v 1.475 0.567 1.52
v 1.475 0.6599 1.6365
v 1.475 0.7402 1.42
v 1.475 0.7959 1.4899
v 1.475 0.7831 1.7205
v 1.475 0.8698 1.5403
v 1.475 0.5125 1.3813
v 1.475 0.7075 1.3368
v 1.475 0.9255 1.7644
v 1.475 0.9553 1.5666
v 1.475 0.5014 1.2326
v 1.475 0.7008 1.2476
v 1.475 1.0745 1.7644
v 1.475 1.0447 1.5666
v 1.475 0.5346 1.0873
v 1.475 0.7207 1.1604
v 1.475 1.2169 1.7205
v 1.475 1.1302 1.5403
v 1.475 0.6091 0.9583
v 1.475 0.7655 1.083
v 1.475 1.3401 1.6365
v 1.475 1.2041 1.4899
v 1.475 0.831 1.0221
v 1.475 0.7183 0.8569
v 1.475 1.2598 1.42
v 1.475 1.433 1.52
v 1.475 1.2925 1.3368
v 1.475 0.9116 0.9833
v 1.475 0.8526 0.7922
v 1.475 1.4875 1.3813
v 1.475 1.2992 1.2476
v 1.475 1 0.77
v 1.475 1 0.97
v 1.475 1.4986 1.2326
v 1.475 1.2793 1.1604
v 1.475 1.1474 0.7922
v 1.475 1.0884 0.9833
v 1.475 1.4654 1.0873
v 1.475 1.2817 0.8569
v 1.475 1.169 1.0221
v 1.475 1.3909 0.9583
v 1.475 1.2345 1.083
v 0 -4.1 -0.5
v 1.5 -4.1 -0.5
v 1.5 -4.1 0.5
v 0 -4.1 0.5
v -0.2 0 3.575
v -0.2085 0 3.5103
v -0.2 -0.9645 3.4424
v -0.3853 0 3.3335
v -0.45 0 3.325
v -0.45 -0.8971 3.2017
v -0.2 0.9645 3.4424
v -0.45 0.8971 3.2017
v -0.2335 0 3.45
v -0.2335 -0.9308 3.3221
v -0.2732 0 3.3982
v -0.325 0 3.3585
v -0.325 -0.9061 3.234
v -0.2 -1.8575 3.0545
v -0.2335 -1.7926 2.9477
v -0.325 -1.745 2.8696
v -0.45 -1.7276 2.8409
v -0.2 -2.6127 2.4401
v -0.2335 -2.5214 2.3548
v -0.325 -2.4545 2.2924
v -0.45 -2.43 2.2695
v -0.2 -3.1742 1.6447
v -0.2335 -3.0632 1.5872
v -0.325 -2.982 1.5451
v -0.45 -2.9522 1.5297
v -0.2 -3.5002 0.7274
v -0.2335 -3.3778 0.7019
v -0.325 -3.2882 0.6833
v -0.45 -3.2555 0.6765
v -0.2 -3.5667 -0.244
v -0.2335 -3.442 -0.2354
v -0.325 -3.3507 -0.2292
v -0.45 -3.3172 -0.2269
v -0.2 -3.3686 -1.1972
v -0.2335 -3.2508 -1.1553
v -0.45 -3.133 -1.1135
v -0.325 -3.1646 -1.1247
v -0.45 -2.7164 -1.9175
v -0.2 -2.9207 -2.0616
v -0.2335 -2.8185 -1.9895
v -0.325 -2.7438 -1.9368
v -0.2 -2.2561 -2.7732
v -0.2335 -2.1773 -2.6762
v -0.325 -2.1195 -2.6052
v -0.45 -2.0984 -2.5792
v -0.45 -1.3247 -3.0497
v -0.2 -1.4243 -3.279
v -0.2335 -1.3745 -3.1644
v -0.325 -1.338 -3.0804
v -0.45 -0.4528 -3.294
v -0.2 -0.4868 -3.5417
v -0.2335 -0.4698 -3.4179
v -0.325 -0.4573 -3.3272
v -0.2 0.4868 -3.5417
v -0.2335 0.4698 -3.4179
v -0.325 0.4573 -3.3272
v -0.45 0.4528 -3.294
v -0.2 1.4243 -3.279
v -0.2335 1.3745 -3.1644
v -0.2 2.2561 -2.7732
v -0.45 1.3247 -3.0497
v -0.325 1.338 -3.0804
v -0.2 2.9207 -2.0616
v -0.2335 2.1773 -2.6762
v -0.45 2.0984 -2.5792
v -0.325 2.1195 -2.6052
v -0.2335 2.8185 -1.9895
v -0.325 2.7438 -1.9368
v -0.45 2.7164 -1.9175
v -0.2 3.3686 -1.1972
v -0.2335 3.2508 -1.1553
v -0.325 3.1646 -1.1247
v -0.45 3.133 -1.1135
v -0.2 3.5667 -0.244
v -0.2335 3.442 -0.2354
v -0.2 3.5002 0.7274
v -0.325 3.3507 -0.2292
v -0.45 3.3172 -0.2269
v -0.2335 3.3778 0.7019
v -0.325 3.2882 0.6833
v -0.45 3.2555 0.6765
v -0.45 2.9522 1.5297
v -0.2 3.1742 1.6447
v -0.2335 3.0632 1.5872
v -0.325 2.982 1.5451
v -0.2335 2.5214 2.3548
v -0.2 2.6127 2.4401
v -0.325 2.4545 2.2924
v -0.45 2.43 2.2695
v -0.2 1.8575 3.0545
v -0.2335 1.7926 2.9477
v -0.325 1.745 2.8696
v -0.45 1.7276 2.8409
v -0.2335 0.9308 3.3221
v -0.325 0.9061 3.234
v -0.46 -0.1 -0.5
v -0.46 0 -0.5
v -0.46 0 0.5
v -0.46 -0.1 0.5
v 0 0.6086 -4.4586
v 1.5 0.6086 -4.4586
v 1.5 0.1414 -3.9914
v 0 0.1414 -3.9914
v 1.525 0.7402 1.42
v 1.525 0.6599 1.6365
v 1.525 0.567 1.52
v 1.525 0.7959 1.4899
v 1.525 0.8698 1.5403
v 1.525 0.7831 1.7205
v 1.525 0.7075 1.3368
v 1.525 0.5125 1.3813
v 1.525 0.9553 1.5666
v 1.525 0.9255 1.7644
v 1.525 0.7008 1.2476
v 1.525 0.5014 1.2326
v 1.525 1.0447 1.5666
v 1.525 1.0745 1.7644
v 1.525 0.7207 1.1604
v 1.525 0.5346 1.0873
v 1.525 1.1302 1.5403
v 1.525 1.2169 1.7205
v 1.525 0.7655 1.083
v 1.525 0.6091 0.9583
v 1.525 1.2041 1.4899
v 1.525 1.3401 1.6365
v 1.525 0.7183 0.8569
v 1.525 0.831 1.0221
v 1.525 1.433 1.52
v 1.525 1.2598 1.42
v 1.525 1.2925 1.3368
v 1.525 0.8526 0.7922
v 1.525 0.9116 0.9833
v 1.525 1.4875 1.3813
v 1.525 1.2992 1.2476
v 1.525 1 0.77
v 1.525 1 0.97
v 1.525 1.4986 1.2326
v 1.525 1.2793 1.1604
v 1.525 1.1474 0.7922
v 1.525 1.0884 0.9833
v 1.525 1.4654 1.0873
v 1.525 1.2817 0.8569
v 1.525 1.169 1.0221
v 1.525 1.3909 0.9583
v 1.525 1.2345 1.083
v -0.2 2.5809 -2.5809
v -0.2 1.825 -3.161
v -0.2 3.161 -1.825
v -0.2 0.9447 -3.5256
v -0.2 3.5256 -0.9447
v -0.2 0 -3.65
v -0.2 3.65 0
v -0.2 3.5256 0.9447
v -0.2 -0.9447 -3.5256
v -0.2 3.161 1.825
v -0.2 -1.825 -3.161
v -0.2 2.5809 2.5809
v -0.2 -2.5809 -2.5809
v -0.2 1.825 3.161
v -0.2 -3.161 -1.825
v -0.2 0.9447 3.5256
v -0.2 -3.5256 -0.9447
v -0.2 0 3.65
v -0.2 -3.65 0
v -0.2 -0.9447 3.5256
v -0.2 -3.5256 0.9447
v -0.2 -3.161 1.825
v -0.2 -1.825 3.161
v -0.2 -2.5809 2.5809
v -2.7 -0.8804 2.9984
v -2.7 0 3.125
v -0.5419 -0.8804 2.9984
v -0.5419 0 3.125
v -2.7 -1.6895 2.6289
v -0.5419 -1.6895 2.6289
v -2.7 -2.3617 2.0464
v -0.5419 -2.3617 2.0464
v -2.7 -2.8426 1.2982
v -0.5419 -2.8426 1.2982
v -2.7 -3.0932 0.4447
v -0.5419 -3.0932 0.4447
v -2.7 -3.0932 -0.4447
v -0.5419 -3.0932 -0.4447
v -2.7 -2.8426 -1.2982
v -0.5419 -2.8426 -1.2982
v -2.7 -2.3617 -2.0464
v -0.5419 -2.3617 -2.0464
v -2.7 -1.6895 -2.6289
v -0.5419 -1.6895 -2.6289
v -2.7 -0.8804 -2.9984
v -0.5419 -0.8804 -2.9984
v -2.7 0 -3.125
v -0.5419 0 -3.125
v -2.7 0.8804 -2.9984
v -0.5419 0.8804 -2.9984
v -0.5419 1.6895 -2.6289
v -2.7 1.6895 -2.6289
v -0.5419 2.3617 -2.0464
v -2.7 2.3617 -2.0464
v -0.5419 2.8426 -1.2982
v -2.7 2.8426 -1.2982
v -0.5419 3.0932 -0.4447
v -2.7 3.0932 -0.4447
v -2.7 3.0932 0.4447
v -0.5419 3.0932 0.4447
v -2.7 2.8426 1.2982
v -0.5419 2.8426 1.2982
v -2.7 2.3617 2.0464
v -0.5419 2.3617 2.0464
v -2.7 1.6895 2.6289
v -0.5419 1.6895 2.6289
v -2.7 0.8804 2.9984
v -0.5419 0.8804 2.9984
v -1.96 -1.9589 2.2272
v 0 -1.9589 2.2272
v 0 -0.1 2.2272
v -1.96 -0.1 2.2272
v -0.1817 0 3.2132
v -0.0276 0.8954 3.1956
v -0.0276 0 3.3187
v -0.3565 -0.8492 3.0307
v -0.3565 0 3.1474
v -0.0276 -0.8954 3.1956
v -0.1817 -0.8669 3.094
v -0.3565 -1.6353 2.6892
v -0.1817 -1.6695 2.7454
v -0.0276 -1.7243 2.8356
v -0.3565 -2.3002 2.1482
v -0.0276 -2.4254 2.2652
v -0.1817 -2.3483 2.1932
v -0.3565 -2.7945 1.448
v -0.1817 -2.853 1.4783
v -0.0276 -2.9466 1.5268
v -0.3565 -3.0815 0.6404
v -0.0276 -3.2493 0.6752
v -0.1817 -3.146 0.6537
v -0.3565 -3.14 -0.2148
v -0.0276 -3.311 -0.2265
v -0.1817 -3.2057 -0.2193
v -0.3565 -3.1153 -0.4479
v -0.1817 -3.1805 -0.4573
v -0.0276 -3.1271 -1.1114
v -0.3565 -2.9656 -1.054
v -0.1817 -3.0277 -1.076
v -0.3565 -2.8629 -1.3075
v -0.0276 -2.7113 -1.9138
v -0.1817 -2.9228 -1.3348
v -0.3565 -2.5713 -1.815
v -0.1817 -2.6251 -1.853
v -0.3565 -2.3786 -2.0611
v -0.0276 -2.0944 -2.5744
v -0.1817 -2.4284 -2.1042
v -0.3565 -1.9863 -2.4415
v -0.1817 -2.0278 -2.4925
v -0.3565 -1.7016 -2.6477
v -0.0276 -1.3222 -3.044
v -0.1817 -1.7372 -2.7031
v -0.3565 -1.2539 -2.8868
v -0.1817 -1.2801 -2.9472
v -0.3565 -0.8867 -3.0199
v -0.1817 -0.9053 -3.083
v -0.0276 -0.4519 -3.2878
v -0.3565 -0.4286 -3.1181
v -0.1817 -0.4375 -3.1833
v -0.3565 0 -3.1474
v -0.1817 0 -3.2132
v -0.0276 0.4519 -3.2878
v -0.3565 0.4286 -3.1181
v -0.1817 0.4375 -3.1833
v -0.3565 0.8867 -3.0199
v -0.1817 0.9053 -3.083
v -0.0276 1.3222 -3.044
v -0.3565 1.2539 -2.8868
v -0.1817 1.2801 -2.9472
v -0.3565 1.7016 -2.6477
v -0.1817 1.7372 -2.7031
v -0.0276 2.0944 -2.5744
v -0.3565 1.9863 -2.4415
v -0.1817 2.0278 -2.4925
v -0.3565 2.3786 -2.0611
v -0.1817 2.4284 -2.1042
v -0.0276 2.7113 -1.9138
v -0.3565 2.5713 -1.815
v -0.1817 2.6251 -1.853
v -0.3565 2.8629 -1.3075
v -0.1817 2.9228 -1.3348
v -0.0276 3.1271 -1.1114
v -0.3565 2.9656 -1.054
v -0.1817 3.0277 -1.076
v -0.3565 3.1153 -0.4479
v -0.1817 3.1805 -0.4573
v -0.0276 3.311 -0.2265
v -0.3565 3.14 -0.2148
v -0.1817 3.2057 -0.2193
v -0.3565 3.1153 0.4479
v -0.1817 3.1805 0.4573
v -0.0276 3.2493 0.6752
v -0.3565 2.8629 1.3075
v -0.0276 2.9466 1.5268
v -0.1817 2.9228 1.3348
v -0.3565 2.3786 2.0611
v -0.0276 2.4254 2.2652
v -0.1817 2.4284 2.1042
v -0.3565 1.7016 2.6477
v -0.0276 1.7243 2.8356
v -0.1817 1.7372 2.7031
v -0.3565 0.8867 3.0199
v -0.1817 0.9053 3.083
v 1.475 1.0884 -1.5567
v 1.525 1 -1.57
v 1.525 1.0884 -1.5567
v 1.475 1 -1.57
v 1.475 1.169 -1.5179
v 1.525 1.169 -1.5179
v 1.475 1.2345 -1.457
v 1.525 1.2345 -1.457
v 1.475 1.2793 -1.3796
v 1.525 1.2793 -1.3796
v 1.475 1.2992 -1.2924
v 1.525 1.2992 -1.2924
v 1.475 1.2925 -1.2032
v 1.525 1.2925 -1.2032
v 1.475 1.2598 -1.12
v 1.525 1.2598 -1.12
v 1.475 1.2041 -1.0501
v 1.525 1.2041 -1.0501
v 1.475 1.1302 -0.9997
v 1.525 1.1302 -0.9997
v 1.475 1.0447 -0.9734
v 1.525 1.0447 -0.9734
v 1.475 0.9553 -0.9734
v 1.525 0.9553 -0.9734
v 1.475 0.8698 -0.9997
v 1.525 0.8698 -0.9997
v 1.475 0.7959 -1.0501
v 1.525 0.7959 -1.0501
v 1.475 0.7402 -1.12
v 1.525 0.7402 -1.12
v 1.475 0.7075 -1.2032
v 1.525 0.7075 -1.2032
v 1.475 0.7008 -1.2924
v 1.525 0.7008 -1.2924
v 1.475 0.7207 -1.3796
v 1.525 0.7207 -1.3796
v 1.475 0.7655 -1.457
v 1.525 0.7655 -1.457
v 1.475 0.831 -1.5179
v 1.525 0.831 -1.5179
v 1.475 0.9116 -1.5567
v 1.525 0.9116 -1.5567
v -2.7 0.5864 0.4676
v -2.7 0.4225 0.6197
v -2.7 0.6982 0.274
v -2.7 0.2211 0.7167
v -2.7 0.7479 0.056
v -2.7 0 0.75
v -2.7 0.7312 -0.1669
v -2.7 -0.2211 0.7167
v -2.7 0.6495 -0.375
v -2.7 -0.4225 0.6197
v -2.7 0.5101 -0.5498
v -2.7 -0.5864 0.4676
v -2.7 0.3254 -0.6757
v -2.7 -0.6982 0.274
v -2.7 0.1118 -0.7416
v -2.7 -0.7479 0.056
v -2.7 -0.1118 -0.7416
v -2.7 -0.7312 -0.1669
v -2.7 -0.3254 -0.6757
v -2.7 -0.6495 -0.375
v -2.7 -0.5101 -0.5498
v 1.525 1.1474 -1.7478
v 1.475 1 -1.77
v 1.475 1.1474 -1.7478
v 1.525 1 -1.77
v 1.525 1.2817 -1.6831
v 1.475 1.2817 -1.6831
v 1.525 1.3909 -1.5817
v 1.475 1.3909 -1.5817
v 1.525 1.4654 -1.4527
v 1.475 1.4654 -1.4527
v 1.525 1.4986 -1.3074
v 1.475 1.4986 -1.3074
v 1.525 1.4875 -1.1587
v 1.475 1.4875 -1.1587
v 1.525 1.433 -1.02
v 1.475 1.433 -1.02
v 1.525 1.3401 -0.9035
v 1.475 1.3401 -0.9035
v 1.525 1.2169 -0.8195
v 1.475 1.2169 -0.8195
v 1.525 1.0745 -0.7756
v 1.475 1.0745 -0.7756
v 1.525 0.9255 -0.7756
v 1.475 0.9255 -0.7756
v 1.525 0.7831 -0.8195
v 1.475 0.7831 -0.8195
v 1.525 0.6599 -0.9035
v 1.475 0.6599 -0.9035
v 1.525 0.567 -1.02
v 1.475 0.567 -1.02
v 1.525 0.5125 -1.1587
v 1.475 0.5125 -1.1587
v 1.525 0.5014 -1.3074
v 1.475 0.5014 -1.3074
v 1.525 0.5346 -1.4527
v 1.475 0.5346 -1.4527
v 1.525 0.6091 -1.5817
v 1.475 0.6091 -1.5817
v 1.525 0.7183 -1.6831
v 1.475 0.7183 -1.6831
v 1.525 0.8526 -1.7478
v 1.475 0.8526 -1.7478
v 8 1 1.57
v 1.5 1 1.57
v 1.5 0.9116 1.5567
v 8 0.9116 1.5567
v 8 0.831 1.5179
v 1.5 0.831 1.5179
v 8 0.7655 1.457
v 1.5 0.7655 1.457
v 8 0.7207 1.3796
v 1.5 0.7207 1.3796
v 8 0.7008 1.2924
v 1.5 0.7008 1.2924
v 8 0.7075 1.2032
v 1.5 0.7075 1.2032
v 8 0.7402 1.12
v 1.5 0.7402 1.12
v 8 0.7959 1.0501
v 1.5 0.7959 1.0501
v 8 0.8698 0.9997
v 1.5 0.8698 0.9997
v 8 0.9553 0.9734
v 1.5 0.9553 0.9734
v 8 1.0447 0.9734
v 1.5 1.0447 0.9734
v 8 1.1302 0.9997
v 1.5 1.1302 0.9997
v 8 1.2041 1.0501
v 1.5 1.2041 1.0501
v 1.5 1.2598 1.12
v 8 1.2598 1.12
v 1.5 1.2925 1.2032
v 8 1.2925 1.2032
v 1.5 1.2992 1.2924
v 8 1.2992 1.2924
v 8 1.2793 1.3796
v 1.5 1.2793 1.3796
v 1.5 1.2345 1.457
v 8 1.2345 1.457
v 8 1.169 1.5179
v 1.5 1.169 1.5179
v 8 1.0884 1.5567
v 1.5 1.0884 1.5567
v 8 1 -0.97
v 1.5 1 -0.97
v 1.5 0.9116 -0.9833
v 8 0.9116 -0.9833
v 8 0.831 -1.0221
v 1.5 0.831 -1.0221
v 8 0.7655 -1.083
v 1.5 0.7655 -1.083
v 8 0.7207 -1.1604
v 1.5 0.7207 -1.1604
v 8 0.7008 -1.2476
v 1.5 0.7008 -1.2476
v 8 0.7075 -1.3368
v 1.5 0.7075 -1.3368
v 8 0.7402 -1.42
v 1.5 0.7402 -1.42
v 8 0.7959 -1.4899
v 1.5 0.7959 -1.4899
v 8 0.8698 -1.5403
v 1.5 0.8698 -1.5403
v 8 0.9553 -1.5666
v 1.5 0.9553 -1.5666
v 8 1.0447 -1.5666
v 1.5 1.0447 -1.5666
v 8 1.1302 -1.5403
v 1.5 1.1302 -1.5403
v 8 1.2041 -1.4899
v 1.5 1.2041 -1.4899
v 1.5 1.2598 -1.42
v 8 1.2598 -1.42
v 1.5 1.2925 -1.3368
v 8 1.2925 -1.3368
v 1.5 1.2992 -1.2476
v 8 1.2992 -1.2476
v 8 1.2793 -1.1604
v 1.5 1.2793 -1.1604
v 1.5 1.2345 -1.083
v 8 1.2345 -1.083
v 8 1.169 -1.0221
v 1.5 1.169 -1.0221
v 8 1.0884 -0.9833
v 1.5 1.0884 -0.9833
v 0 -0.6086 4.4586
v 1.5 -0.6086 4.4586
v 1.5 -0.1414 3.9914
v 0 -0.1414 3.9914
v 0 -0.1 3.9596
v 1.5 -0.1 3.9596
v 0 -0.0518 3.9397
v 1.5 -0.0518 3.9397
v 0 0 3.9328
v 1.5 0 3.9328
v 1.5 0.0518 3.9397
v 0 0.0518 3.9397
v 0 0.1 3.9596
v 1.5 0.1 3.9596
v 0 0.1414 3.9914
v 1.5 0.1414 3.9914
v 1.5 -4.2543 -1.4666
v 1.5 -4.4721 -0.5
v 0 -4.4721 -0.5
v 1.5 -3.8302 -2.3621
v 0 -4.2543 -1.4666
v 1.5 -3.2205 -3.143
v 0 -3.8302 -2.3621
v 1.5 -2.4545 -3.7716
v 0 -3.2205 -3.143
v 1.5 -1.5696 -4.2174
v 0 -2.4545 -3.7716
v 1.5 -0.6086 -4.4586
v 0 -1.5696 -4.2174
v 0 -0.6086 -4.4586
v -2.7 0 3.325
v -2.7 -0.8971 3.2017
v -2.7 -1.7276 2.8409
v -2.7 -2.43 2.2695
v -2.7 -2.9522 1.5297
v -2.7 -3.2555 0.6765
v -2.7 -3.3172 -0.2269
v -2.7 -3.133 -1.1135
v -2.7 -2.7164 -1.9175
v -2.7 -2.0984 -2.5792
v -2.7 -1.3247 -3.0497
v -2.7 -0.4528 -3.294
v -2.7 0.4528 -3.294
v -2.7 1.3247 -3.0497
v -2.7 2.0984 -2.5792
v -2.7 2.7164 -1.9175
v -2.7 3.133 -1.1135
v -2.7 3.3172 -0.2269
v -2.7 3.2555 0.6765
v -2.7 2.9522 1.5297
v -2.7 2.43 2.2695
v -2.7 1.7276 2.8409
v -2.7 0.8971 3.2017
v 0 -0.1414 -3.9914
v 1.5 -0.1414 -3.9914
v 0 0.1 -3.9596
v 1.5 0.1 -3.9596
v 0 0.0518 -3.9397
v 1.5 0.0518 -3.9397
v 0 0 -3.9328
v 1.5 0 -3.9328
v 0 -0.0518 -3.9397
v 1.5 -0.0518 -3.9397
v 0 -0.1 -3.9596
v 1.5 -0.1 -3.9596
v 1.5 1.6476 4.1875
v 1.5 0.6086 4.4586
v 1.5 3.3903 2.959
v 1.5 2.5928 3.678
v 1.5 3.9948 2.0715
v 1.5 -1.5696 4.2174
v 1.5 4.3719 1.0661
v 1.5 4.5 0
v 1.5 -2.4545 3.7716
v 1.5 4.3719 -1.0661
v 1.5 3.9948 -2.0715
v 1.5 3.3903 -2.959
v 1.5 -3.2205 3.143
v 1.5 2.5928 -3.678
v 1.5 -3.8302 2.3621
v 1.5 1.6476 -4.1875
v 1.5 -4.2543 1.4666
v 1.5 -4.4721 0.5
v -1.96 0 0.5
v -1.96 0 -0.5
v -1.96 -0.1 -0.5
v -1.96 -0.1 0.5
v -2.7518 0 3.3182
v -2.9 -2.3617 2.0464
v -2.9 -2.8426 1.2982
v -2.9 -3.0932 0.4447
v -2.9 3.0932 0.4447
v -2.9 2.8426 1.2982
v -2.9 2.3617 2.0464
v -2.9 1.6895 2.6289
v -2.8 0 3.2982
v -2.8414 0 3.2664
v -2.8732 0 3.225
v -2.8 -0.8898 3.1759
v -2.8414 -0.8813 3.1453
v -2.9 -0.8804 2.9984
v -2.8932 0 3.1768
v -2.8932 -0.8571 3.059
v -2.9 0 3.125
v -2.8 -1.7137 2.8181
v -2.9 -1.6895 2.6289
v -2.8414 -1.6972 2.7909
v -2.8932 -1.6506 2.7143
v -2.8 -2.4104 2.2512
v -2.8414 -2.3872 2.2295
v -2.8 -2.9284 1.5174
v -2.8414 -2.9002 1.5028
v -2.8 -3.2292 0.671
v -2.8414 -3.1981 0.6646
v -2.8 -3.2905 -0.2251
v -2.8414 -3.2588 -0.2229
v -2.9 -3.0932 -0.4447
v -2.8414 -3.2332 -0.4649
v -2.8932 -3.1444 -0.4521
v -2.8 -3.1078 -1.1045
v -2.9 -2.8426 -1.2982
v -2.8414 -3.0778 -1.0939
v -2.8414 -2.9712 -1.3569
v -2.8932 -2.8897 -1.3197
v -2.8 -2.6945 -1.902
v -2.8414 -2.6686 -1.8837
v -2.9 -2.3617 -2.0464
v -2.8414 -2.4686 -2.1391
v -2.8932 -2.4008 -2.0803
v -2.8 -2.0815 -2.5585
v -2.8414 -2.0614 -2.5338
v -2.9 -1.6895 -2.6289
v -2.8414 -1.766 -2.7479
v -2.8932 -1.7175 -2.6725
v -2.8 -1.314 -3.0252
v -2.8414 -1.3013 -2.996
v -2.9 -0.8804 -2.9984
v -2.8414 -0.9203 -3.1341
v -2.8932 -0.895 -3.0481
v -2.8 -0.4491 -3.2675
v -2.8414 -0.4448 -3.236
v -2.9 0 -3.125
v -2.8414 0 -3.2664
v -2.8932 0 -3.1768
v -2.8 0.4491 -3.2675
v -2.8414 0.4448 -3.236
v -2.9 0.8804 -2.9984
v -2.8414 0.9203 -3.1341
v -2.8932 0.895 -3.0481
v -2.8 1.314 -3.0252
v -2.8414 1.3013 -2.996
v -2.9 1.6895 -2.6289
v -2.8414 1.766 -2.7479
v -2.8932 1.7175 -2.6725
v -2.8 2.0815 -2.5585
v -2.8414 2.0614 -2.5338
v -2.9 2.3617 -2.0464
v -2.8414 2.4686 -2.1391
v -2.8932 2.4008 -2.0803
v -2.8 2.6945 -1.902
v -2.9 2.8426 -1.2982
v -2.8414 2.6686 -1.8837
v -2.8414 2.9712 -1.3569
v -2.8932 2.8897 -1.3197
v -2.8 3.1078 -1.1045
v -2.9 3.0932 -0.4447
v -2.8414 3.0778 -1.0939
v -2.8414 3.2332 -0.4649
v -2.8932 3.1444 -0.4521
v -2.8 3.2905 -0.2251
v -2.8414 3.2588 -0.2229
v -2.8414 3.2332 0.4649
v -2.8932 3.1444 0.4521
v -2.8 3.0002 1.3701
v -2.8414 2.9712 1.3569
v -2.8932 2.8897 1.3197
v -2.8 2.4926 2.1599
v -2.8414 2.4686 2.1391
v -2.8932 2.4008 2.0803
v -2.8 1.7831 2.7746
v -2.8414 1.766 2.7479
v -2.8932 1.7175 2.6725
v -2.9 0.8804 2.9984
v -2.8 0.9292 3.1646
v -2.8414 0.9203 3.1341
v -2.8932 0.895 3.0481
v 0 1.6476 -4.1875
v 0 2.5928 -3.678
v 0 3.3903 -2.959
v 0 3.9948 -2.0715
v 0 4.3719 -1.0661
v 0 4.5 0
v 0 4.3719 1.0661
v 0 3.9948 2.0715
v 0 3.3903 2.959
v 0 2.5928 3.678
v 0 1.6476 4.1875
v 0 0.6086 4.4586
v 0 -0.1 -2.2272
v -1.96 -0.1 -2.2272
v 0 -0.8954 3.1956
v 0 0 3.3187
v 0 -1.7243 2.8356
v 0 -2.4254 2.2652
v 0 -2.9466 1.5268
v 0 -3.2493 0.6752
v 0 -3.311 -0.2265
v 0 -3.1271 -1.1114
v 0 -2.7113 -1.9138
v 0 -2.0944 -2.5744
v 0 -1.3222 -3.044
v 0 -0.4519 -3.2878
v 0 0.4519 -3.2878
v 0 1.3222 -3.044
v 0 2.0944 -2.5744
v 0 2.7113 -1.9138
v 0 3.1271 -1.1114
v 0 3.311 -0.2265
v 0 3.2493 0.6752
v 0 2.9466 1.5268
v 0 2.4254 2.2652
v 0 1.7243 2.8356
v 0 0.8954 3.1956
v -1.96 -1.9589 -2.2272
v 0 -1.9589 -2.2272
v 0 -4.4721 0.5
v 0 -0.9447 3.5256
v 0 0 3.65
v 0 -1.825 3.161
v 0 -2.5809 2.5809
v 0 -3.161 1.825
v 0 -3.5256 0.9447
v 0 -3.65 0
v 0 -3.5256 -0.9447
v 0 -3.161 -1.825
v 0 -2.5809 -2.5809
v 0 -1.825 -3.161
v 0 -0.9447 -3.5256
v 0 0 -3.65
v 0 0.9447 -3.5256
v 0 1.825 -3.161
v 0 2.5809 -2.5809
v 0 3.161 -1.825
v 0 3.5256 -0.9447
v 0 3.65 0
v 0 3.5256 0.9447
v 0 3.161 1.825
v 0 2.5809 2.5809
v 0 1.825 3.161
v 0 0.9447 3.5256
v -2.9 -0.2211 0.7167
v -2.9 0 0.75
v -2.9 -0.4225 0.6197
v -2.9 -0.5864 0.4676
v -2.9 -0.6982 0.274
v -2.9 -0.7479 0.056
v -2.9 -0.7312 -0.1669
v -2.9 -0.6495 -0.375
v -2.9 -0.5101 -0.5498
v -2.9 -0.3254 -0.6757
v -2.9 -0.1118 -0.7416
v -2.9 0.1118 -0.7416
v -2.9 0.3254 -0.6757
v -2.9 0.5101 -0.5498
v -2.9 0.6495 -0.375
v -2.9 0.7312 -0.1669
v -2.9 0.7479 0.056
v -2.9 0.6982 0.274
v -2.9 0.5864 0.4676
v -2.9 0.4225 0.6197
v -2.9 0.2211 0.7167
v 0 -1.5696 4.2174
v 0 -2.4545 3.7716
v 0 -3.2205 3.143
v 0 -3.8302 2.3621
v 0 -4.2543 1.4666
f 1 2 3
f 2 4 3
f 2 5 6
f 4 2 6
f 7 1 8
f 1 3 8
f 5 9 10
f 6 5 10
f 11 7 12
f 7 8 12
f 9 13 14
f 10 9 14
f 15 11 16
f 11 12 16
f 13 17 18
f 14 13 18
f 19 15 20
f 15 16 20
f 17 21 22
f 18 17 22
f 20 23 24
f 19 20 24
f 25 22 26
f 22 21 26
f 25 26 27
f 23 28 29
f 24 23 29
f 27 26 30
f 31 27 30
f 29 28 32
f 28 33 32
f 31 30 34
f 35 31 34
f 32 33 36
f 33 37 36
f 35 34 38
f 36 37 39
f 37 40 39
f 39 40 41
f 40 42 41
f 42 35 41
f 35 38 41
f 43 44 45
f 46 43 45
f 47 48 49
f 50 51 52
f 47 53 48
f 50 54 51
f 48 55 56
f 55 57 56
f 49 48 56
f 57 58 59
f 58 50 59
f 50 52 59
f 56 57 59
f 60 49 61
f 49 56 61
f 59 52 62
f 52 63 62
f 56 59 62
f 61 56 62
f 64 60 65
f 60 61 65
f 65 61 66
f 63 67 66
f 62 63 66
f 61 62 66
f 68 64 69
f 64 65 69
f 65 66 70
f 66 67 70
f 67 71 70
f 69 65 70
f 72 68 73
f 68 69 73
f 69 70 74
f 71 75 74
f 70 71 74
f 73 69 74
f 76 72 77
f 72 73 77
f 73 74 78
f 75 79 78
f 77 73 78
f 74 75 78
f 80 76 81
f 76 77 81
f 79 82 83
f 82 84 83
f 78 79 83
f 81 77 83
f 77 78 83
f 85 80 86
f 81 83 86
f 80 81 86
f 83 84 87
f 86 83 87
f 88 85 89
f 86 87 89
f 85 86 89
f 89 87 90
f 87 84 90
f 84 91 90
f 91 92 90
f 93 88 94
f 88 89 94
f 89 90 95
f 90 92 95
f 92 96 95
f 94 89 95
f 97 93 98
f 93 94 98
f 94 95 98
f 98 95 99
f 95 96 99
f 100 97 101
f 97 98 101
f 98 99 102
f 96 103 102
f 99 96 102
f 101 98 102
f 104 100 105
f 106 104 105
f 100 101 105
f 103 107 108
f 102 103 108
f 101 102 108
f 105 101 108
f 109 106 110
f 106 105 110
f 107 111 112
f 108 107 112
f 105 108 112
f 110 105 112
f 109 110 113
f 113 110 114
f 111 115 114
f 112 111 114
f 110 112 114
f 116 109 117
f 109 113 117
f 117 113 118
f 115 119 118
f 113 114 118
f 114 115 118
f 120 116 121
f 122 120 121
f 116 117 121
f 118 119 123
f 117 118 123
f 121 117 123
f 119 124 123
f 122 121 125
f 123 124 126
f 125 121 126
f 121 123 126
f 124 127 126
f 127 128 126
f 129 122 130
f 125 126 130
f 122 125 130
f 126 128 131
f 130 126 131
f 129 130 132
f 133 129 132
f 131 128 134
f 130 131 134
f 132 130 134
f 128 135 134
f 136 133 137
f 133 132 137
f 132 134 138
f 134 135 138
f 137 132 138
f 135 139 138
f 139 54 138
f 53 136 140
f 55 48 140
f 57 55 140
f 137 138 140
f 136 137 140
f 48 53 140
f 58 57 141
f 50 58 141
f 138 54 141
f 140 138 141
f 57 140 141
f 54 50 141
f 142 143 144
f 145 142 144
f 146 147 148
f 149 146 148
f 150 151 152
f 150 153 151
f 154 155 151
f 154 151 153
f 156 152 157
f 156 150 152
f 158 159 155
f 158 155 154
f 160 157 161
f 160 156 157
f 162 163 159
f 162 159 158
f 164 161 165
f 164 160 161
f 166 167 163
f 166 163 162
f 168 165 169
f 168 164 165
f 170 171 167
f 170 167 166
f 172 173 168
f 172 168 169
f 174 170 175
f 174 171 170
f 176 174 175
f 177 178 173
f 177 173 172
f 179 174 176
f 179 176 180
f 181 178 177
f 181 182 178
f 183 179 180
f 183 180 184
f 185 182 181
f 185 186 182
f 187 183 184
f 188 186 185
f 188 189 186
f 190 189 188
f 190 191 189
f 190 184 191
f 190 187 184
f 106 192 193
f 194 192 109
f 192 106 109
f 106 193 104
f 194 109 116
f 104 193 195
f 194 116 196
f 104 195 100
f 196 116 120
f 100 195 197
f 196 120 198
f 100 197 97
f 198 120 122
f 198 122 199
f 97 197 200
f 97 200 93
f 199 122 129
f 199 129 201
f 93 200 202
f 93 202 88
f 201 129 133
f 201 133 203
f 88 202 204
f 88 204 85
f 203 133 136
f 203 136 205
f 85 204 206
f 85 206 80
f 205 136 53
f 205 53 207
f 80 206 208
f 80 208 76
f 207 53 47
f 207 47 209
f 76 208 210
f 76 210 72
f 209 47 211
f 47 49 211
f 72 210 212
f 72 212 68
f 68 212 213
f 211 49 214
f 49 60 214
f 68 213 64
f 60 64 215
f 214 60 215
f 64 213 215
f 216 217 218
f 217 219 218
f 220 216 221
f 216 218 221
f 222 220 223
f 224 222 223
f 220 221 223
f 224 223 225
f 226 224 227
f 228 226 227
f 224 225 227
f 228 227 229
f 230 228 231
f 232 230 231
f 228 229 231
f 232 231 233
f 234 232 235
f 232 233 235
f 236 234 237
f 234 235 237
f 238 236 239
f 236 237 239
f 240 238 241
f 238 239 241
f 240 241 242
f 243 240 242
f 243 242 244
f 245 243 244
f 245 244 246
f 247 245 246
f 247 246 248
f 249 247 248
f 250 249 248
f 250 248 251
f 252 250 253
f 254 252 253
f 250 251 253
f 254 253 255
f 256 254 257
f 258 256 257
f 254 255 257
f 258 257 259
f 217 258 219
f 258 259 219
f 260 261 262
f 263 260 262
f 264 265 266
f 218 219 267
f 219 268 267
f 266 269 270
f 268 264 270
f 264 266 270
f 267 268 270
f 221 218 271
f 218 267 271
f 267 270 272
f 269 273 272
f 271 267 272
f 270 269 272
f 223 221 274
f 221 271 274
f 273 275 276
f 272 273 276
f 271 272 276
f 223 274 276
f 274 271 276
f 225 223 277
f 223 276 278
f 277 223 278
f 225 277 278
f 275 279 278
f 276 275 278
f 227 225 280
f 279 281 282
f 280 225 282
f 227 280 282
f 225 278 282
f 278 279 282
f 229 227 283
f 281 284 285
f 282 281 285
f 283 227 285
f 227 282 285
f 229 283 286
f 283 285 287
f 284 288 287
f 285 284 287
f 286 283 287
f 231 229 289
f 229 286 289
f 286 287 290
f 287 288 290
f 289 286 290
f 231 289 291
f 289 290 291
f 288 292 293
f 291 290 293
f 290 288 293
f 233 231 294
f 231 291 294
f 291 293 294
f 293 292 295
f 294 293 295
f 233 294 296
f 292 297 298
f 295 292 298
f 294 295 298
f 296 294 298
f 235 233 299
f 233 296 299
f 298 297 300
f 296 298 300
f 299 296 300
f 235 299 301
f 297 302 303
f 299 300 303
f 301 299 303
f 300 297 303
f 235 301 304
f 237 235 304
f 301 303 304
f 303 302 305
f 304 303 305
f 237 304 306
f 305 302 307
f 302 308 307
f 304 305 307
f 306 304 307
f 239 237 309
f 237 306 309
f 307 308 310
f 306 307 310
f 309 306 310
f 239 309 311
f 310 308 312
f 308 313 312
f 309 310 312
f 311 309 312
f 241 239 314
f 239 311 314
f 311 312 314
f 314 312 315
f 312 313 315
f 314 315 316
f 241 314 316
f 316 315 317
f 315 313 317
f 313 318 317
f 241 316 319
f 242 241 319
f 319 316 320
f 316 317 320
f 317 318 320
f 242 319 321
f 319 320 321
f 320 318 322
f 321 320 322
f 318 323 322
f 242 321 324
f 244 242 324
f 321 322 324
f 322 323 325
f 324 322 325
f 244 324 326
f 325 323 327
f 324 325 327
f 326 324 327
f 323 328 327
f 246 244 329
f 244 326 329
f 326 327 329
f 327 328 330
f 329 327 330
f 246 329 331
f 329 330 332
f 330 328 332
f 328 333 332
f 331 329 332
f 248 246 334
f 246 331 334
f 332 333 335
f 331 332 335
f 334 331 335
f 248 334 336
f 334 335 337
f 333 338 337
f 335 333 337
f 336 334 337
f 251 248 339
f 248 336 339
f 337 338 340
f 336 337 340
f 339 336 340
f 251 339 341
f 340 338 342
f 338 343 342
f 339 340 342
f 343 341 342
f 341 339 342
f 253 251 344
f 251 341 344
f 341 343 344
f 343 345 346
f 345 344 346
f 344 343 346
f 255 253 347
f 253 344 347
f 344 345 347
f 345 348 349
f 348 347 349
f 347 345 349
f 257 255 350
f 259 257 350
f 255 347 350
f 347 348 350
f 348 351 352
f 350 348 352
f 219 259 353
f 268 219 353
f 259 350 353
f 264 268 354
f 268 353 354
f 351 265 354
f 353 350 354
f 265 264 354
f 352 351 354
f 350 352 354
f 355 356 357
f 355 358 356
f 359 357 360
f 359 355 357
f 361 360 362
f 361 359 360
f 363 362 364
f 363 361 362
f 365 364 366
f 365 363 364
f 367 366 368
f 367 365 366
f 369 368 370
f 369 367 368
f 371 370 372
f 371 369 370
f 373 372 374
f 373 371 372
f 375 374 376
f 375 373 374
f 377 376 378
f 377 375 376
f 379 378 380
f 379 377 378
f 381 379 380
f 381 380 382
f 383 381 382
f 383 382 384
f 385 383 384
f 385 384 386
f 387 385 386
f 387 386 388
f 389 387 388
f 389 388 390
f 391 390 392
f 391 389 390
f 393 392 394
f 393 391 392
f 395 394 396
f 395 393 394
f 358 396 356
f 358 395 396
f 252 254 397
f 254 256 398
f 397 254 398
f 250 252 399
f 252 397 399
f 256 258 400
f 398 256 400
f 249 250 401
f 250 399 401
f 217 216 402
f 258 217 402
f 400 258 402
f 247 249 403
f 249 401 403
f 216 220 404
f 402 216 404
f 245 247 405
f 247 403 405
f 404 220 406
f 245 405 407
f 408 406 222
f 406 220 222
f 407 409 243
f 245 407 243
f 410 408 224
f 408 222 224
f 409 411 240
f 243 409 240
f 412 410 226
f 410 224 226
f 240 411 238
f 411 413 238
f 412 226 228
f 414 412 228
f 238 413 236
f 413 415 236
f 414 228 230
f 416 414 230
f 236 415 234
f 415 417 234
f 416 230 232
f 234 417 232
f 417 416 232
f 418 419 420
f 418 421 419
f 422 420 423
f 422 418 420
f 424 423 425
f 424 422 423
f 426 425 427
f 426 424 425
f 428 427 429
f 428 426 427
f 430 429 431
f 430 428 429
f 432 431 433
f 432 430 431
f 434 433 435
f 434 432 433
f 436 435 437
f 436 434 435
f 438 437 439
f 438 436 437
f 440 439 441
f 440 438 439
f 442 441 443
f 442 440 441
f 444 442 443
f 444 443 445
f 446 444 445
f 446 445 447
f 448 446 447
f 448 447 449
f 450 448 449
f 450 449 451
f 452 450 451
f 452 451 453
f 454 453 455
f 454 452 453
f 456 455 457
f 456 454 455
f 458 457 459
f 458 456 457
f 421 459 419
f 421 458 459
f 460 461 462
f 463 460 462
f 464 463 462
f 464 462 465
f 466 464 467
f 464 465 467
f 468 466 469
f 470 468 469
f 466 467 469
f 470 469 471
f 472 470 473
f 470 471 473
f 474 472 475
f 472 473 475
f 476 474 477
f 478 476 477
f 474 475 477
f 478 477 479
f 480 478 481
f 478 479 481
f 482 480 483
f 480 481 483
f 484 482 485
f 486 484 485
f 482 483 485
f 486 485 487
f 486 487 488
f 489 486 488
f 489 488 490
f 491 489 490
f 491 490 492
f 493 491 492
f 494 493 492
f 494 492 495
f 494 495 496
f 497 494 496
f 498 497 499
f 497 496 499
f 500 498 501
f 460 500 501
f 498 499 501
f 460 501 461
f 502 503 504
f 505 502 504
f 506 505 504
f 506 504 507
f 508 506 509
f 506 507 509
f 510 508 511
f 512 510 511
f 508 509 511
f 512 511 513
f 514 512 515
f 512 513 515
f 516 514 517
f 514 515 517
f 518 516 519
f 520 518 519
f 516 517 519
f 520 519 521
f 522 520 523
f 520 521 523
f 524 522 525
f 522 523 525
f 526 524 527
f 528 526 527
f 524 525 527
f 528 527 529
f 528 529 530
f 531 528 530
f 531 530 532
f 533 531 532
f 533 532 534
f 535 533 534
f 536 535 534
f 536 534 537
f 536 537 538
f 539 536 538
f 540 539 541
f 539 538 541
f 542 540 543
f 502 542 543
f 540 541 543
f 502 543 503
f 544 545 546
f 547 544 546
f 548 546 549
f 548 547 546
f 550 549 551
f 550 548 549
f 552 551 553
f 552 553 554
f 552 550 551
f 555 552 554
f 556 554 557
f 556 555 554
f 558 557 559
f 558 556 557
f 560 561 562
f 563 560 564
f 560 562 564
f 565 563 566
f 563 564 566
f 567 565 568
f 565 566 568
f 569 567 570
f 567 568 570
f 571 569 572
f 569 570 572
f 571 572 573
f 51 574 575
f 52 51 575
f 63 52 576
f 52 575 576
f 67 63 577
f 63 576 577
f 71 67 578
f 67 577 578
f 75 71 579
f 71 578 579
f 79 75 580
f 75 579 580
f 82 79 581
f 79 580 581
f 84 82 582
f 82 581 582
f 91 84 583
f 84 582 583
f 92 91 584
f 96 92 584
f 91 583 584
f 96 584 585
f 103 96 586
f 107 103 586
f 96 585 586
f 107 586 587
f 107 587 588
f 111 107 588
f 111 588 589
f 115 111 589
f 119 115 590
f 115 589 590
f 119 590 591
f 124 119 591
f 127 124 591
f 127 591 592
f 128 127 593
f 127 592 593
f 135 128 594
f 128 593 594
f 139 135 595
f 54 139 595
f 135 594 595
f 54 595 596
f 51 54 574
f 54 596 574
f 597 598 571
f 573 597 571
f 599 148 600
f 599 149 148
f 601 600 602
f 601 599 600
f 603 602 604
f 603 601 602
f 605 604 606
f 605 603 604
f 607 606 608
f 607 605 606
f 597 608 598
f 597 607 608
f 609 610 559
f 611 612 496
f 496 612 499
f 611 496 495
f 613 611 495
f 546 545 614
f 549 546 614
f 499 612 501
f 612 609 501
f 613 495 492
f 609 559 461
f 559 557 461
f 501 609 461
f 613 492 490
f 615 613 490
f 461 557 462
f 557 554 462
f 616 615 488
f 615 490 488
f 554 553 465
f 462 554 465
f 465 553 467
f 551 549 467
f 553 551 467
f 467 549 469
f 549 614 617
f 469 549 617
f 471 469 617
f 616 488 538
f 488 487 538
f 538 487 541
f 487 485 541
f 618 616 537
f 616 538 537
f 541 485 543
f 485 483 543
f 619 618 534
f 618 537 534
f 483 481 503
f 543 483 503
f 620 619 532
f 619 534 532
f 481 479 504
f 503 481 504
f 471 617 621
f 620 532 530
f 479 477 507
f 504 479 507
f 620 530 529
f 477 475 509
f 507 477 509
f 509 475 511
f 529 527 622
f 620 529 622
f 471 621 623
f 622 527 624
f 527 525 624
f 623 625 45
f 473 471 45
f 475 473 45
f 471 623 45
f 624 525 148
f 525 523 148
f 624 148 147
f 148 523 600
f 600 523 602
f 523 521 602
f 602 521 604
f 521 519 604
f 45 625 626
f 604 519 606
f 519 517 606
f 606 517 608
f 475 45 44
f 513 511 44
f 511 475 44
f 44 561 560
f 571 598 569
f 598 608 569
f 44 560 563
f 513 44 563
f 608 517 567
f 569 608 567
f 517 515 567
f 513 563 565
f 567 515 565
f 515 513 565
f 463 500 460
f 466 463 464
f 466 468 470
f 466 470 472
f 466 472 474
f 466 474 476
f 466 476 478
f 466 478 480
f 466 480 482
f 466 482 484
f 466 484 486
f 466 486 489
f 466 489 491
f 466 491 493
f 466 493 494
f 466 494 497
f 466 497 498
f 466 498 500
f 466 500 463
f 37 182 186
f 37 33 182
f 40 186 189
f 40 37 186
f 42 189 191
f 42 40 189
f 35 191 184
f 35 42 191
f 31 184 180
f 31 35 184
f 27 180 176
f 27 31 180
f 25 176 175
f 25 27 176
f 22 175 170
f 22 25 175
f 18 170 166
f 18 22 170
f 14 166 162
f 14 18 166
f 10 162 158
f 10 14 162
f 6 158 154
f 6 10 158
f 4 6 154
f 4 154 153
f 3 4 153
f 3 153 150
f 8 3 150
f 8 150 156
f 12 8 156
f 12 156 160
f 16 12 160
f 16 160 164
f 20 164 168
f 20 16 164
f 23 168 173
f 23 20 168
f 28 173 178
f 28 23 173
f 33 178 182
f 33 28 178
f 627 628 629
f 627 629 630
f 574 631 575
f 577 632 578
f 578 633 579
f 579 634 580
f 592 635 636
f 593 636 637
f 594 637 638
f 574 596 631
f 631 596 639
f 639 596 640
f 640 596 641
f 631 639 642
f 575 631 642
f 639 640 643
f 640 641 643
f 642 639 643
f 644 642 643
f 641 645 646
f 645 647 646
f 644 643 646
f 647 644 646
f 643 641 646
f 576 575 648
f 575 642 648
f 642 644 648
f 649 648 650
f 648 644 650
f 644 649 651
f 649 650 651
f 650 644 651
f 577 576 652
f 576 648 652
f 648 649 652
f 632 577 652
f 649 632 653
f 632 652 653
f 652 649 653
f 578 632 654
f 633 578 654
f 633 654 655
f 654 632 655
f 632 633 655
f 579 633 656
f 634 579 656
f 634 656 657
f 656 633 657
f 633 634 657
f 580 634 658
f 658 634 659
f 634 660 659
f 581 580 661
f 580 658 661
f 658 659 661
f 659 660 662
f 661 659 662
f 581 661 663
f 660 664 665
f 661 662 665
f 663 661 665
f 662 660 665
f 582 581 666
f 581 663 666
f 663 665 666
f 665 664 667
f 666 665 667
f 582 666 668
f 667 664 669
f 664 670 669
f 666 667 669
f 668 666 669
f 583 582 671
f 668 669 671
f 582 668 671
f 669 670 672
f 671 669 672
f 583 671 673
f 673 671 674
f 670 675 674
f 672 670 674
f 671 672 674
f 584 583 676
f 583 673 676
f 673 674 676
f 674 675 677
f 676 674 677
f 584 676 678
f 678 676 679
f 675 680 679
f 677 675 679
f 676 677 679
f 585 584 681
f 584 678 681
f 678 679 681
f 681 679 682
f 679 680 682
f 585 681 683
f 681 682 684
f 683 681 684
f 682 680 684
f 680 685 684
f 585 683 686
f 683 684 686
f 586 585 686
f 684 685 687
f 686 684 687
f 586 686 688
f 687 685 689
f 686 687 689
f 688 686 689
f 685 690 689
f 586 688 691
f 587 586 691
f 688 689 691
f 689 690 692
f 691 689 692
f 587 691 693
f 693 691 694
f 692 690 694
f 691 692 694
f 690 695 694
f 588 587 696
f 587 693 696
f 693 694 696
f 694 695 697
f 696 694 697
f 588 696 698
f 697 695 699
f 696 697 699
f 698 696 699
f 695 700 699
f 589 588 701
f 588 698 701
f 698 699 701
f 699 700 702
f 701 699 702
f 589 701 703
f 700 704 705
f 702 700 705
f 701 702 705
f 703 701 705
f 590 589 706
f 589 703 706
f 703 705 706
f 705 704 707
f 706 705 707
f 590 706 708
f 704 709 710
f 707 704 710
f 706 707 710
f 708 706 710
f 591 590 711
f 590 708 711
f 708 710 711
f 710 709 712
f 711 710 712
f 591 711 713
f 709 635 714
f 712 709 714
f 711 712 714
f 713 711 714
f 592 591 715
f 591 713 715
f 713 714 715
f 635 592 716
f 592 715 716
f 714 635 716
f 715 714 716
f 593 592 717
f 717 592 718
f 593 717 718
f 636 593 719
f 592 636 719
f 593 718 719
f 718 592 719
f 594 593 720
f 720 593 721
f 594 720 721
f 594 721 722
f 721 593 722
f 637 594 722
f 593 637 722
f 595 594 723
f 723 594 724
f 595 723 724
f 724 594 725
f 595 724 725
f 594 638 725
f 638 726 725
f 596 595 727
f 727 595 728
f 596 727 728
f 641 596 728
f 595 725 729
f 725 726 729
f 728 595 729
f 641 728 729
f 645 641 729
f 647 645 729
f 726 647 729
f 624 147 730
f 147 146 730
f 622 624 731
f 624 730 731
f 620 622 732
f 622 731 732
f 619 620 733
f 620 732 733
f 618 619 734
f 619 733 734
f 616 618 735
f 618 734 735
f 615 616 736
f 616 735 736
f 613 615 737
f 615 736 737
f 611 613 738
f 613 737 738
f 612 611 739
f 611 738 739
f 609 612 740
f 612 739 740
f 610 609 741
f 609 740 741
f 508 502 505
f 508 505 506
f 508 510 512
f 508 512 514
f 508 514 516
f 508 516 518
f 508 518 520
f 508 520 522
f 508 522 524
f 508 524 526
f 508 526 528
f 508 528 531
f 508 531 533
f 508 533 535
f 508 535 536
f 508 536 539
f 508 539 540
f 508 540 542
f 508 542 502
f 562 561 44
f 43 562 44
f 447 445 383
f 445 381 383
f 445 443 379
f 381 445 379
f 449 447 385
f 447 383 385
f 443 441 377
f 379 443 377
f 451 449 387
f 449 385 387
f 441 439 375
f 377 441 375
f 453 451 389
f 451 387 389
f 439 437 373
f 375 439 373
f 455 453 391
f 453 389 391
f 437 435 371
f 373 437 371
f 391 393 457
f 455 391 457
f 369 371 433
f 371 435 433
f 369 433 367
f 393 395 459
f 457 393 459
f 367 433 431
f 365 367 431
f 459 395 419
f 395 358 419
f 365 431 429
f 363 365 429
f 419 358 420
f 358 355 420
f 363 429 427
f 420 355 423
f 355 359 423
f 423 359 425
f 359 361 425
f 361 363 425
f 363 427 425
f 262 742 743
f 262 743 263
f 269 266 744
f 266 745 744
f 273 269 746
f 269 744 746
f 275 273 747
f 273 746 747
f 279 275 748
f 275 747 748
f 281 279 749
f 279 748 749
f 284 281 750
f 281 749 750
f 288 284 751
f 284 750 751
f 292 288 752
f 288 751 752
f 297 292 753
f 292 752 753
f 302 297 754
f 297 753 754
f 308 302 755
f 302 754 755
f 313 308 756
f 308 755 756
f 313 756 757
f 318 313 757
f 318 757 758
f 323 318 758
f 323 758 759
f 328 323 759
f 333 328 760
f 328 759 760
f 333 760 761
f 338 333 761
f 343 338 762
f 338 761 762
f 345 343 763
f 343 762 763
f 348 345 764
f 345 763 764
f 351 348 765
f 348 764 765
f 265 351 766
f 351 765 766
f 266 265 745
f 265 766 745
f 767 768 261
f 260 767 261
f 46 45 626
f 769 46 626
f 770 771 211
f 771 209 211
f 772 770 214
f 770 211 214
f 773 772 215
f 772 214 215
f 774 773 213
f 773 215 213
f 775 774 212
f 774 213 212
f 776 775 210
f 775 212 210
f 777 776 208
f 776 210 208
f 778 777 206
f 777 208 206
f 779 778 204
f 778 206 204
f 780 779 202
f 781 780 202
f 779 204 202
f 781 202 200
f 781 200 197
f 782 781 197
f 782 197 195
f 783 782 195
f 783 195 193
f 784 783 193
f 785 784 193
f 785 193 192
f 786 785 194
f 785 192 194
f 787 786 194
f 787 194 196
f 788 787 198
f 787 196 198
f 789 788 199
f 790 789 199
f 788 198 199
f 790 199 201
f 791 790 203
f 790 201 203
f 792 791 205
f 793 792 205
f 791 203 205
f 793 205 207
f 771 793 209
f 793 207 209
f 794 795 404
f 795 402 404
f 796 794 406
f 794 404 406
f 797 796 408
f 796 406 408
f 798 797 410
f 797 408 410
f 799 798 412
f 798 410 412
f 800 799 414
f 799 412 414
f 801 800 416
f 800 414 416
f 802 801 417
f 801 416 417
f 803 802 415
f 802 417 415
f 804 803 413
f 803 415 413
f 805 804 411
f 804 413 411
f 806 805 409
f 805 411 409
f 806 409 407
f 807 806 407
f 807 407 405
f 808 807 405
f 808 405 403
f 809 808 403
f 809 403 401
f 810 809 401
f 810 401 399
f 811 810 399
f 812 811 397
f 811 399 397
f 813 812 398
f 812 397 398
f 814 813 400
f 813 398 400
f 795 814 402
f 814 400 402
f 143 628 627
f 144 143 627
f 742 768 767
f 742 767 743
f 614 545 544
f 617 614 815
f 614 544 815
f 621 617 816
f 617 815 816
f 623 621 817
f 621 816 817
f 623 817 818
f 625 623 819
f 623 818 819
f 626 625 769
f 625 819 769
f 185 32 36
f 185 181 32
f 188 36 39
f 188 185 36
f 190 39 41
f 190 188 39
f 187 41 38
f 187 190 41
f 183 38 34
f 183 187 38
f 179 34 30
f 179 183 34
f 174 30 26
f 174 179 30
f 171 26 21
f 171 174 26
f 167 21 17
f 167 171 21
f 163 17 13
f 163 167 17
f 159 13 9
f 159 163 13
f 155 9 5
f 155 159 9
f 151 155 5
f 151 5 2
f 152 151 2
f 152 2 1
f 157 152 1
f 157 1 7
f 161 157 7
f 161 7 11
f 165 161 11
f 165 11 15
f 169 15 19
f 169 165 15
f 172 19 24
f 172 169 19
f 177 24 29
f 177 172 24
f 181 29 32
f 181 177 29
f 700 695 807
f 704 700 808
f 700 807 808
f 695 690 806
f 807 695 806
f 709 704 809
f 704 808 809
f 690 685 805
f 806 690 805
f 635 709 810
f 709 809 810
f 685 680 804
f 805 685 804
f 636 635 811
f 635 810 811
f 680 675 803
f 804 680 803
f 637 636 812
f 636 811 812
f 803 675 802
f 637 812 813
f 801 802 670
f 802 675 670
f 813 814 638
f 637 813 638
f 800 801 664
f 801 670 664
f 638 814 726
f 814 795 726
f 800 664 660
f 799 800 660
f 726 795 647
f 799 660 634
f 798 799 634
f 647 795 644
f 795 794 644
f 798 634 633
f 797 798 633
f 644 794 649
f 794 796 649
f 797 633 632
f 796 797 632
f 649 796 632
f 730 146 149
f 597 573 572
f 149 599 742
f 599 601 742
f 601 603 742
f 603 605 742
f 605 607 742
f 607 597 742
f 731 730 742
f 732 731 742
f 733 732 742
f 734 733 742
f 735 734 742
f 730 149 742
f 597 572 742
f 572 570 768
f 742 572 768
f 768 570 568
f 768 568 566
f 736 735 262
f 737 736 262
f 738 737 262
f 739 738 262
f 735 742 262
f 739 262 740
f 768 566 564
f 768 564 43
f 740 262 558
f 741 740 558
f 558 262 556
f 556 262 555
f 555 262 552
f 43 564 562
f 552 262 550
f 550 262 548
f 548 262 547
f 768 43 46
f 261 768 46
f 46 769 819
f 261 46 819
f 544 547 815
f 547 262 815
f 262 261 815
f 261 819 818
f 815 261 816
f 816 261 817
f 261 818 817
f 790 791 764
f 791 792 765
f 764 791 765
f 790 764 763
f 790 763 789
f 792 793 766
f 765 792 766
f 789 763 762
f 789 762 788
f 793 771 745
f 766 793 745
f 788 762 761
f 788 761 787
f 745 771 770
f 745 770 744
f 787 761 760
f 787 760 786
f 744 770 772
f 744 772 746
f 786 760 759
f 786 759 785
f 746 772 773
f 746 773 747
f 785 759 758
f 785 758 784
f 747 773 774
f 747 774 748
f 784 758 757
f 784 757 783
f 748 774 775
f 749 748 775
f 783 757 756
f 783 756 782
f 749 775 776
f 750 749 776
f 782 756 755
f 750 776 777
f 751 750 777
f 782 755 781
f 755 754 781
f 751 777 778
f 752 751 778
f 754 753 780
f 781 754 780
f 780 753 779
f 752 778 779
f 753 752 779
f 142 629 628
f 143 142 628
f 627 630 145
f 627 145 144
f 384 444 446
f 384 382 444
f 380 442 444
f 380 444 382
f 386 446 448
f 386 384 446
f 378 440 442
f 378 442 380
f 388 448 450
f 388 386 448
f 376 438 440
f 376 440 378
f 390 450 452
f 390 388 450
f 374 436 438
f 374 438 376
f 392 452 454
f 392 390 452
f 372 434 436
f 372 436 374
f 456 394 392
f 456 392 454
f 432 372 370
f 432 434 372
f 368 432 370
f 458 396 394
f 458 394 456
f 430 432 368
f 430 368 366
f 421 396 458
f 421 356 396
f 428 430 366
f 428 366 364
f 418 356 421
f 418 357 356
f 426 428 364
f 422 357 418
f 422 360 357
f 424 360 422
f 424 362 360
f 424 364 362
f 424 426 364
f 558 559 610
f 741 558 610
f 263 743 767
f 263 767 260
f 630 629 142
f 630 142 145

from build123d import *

# Parameters (mm, degrees)
SKETCH6_R             = 0.3
EXTRUDE2_DEPTH        = 6.5
SKETCH13_R            = 0.5
SKETCH13_R_2          = 0.3
BOSS_EXTRUDE5_DEPTH   = 0.025
BOSS_EXTRUDE5_2_DEPTH = 0.025
SKETCH11_W            = 4.454312554
SKETCH11_H            = 1.858889087
BOSS_EXTRUDE3_DEPTH   = 1.96
SKETCH12_W            = 1
SKETCH12_H            = 0.1
BOSS_EXTRUDE4_DEPTH   = 1.5
CUT_EXTRUDE2_DEPTH    = 10.096702699
FILLET7_R             = 0.2
FILLET8_R             = 0.2


with BuildPart() as part:
    # Sketch4 → Revolve2 (revolve)
    with BuildSketch(Plane.XY):
        Polygon((0, 3.318708392), (0, 0), (1.5, 0), (1.5, 4.5), (0, 4.5), (0, 3.65), align=None)
    revolve(axis=Axis((-2.49171246, 0, 0), (1, 0, 0)))

    # Sketch6 → Extrude2 (add)
    with BuildSketch(Plane(origin=(1.5, 0, 0), x_dir=(0, 0, -1), z_dir=(1, 0, 0))):
        with Locations((-1.27, 1)):
            Circle(SKETCH6_R)
        with Locations((1.27, 1)):
            Circle(SKETCH6_R)
    extrude(amount=EXTRUDE2_DEPTH)

    # Sketch11 → Boss-Extrude3 (add)
    with BuildSketch(Plane.ZY):
        with Locations((0, -1.029444544)):
            Rectangle(SKETCH11_W, SKETCH11_H)
    extrude(amount=BOSS_EXTRUDE3_DEPTH)

    # Sketch8 → Cut-Extrude2 (cut, through all)
    with BuildSketch(Plane(origin=(1.5, 0, 0), x_dir=(0, 0, -1), z_dir=(1, 0, 0))):
        with BuildLine():
            Line((4.458648555, 0.608648555), (3.85, 0))
            Line((3.85, 0), (4.458648555, -0.608648555))
            ThreePointArc((4.458648555, -0.608648555), (4.5, 0), (4.458648555, 0.608648555))
        make_face()
        with BuildLine():
            Line((-3.85, 0), (-4.458648555, 0.608648555))
            ThreePointArc((-4.458648555, 0.608648555), (-4.5, 0), (-4.458648555, -0.608648555))
            Line((-4.458648555, -0.608648555), (-3.85, 0))
        make_face()
        with BuildLine():
            ThreePointArc((-0.5, -4.472135955), (0, -4.5), (0.5, -4.472135955))
            Line((0.5, -4.472135955), (0.5, -4.1))
            Line((0.5, -4.1), (-0.5, -4.1))
            Line((-0.5, -4.1), (-0.5, -4.472135955))
        make_face()
    extrude(amount=-CUT_EXTRUDE2_DEPTH, mode=Mode.SUBTRACT)

    # Fillet7
    fillet7_edges = [part.edges().sort_by_distance(p)[0] for p in [
        (0.75, 0, 3.85),
        (0.75, 0, -3.85),
    ]]
    fillet(fillet7_edges, radius=FILLET7_R)


with BuildPart() as body_2:
    # Sketch4<5> → Revolve3 (revolve)
    with BuildSketch(Plane.XY):
        with BuildLine():
            Line((-0.027565235, 3.318708392), (0, 3.318708392))
            Line((0, 3.318708392), (0, 3.65))
            Line((0, 3.65), (-0.2, 3.65))
            Line((-0.2, 3.65), (-0.2, 3.575))
            ThreePointArc((-0.2, 3.575), (-0.273223305, 3.398223305), (-0.45, 3.325))
            Line((-0.45, 3.325), (-2.9, 3.325))
            Line((-2.9, 3.325), (-2.9, 0.75))
            Line((-2.9, 0.75), (-2.7, 0.75))
            Line((-2.7, 0.75), (-2.7, 3.125))
            Line((-2.7, 3.125), (-0.541893018, 3.125))
            ThreePointArc((-0.541893018, 3.125), (-0.267094906, 3.175032427), (-0.027565235, 3.318708392))
        make_face()
    revolve(axis=Axis((-2.49171246, 0, 0), (1, 0, 0)))

    # Fillet8
    fillet8_edges = [body_2.edges().sort_by_distance(p)[0] for p in [
        (-2.9, -3.325, 0),
    ]]
    fillet(fillet8_edges, radius=FILLET8_R)


with BuildPart() as body_3:
    # Sketch13 → Boss-Extrude5 (new, symmetric)
    with BuildSketch(Plane(origin=(1.5, 0, 0), x_dir=(0, 0, -1), z_dir=(1, 0, 0))):
        with Locations((-1.27, 1)):
            Circle(SKETCH13_R)
        with Locations((-1.27, 1)):
            Circle(SKETCH13_R_2, mode=Mode.SUBTRACT)
    extrude(amount=BOSS_EXTRUDE5_DEPTH, both=True)


with BuildPart() as body_4:
    # Sketch13 → Boss-Extrude5 2 (new, symmetric)
    with BuildSketch(Plane(origin=(1.5, 0, 0), x_dir=(0, 0, -1), z_dir=(1, 0, 0))):
        with Locations((1.27, 1)):
            Circle(SKETCH13_R)
        with Locations((1.27, 1)):
            Circle(SKETCH13_R_2, mode=Mode.SUBTRACT)
    extrude(amount=BOSS_EXTRUDE5_2_DEPTH, both=True)


with BuildPart() as body_5:
    # Sketch12 → Boss-Extrude4 (new body)
    with BuildSketch(Plane.ZY.offset(1.96)):
        with Locations((0, -0.05)):
            Rectangle(SKETCH12_W, SKETCH12_H)
    extrude(amount=-BOSS_EXTRUDE4_DEPTH)


solid = Compound([part.part, body_2.part, body_3.part, body_4.part, body_5.part])
